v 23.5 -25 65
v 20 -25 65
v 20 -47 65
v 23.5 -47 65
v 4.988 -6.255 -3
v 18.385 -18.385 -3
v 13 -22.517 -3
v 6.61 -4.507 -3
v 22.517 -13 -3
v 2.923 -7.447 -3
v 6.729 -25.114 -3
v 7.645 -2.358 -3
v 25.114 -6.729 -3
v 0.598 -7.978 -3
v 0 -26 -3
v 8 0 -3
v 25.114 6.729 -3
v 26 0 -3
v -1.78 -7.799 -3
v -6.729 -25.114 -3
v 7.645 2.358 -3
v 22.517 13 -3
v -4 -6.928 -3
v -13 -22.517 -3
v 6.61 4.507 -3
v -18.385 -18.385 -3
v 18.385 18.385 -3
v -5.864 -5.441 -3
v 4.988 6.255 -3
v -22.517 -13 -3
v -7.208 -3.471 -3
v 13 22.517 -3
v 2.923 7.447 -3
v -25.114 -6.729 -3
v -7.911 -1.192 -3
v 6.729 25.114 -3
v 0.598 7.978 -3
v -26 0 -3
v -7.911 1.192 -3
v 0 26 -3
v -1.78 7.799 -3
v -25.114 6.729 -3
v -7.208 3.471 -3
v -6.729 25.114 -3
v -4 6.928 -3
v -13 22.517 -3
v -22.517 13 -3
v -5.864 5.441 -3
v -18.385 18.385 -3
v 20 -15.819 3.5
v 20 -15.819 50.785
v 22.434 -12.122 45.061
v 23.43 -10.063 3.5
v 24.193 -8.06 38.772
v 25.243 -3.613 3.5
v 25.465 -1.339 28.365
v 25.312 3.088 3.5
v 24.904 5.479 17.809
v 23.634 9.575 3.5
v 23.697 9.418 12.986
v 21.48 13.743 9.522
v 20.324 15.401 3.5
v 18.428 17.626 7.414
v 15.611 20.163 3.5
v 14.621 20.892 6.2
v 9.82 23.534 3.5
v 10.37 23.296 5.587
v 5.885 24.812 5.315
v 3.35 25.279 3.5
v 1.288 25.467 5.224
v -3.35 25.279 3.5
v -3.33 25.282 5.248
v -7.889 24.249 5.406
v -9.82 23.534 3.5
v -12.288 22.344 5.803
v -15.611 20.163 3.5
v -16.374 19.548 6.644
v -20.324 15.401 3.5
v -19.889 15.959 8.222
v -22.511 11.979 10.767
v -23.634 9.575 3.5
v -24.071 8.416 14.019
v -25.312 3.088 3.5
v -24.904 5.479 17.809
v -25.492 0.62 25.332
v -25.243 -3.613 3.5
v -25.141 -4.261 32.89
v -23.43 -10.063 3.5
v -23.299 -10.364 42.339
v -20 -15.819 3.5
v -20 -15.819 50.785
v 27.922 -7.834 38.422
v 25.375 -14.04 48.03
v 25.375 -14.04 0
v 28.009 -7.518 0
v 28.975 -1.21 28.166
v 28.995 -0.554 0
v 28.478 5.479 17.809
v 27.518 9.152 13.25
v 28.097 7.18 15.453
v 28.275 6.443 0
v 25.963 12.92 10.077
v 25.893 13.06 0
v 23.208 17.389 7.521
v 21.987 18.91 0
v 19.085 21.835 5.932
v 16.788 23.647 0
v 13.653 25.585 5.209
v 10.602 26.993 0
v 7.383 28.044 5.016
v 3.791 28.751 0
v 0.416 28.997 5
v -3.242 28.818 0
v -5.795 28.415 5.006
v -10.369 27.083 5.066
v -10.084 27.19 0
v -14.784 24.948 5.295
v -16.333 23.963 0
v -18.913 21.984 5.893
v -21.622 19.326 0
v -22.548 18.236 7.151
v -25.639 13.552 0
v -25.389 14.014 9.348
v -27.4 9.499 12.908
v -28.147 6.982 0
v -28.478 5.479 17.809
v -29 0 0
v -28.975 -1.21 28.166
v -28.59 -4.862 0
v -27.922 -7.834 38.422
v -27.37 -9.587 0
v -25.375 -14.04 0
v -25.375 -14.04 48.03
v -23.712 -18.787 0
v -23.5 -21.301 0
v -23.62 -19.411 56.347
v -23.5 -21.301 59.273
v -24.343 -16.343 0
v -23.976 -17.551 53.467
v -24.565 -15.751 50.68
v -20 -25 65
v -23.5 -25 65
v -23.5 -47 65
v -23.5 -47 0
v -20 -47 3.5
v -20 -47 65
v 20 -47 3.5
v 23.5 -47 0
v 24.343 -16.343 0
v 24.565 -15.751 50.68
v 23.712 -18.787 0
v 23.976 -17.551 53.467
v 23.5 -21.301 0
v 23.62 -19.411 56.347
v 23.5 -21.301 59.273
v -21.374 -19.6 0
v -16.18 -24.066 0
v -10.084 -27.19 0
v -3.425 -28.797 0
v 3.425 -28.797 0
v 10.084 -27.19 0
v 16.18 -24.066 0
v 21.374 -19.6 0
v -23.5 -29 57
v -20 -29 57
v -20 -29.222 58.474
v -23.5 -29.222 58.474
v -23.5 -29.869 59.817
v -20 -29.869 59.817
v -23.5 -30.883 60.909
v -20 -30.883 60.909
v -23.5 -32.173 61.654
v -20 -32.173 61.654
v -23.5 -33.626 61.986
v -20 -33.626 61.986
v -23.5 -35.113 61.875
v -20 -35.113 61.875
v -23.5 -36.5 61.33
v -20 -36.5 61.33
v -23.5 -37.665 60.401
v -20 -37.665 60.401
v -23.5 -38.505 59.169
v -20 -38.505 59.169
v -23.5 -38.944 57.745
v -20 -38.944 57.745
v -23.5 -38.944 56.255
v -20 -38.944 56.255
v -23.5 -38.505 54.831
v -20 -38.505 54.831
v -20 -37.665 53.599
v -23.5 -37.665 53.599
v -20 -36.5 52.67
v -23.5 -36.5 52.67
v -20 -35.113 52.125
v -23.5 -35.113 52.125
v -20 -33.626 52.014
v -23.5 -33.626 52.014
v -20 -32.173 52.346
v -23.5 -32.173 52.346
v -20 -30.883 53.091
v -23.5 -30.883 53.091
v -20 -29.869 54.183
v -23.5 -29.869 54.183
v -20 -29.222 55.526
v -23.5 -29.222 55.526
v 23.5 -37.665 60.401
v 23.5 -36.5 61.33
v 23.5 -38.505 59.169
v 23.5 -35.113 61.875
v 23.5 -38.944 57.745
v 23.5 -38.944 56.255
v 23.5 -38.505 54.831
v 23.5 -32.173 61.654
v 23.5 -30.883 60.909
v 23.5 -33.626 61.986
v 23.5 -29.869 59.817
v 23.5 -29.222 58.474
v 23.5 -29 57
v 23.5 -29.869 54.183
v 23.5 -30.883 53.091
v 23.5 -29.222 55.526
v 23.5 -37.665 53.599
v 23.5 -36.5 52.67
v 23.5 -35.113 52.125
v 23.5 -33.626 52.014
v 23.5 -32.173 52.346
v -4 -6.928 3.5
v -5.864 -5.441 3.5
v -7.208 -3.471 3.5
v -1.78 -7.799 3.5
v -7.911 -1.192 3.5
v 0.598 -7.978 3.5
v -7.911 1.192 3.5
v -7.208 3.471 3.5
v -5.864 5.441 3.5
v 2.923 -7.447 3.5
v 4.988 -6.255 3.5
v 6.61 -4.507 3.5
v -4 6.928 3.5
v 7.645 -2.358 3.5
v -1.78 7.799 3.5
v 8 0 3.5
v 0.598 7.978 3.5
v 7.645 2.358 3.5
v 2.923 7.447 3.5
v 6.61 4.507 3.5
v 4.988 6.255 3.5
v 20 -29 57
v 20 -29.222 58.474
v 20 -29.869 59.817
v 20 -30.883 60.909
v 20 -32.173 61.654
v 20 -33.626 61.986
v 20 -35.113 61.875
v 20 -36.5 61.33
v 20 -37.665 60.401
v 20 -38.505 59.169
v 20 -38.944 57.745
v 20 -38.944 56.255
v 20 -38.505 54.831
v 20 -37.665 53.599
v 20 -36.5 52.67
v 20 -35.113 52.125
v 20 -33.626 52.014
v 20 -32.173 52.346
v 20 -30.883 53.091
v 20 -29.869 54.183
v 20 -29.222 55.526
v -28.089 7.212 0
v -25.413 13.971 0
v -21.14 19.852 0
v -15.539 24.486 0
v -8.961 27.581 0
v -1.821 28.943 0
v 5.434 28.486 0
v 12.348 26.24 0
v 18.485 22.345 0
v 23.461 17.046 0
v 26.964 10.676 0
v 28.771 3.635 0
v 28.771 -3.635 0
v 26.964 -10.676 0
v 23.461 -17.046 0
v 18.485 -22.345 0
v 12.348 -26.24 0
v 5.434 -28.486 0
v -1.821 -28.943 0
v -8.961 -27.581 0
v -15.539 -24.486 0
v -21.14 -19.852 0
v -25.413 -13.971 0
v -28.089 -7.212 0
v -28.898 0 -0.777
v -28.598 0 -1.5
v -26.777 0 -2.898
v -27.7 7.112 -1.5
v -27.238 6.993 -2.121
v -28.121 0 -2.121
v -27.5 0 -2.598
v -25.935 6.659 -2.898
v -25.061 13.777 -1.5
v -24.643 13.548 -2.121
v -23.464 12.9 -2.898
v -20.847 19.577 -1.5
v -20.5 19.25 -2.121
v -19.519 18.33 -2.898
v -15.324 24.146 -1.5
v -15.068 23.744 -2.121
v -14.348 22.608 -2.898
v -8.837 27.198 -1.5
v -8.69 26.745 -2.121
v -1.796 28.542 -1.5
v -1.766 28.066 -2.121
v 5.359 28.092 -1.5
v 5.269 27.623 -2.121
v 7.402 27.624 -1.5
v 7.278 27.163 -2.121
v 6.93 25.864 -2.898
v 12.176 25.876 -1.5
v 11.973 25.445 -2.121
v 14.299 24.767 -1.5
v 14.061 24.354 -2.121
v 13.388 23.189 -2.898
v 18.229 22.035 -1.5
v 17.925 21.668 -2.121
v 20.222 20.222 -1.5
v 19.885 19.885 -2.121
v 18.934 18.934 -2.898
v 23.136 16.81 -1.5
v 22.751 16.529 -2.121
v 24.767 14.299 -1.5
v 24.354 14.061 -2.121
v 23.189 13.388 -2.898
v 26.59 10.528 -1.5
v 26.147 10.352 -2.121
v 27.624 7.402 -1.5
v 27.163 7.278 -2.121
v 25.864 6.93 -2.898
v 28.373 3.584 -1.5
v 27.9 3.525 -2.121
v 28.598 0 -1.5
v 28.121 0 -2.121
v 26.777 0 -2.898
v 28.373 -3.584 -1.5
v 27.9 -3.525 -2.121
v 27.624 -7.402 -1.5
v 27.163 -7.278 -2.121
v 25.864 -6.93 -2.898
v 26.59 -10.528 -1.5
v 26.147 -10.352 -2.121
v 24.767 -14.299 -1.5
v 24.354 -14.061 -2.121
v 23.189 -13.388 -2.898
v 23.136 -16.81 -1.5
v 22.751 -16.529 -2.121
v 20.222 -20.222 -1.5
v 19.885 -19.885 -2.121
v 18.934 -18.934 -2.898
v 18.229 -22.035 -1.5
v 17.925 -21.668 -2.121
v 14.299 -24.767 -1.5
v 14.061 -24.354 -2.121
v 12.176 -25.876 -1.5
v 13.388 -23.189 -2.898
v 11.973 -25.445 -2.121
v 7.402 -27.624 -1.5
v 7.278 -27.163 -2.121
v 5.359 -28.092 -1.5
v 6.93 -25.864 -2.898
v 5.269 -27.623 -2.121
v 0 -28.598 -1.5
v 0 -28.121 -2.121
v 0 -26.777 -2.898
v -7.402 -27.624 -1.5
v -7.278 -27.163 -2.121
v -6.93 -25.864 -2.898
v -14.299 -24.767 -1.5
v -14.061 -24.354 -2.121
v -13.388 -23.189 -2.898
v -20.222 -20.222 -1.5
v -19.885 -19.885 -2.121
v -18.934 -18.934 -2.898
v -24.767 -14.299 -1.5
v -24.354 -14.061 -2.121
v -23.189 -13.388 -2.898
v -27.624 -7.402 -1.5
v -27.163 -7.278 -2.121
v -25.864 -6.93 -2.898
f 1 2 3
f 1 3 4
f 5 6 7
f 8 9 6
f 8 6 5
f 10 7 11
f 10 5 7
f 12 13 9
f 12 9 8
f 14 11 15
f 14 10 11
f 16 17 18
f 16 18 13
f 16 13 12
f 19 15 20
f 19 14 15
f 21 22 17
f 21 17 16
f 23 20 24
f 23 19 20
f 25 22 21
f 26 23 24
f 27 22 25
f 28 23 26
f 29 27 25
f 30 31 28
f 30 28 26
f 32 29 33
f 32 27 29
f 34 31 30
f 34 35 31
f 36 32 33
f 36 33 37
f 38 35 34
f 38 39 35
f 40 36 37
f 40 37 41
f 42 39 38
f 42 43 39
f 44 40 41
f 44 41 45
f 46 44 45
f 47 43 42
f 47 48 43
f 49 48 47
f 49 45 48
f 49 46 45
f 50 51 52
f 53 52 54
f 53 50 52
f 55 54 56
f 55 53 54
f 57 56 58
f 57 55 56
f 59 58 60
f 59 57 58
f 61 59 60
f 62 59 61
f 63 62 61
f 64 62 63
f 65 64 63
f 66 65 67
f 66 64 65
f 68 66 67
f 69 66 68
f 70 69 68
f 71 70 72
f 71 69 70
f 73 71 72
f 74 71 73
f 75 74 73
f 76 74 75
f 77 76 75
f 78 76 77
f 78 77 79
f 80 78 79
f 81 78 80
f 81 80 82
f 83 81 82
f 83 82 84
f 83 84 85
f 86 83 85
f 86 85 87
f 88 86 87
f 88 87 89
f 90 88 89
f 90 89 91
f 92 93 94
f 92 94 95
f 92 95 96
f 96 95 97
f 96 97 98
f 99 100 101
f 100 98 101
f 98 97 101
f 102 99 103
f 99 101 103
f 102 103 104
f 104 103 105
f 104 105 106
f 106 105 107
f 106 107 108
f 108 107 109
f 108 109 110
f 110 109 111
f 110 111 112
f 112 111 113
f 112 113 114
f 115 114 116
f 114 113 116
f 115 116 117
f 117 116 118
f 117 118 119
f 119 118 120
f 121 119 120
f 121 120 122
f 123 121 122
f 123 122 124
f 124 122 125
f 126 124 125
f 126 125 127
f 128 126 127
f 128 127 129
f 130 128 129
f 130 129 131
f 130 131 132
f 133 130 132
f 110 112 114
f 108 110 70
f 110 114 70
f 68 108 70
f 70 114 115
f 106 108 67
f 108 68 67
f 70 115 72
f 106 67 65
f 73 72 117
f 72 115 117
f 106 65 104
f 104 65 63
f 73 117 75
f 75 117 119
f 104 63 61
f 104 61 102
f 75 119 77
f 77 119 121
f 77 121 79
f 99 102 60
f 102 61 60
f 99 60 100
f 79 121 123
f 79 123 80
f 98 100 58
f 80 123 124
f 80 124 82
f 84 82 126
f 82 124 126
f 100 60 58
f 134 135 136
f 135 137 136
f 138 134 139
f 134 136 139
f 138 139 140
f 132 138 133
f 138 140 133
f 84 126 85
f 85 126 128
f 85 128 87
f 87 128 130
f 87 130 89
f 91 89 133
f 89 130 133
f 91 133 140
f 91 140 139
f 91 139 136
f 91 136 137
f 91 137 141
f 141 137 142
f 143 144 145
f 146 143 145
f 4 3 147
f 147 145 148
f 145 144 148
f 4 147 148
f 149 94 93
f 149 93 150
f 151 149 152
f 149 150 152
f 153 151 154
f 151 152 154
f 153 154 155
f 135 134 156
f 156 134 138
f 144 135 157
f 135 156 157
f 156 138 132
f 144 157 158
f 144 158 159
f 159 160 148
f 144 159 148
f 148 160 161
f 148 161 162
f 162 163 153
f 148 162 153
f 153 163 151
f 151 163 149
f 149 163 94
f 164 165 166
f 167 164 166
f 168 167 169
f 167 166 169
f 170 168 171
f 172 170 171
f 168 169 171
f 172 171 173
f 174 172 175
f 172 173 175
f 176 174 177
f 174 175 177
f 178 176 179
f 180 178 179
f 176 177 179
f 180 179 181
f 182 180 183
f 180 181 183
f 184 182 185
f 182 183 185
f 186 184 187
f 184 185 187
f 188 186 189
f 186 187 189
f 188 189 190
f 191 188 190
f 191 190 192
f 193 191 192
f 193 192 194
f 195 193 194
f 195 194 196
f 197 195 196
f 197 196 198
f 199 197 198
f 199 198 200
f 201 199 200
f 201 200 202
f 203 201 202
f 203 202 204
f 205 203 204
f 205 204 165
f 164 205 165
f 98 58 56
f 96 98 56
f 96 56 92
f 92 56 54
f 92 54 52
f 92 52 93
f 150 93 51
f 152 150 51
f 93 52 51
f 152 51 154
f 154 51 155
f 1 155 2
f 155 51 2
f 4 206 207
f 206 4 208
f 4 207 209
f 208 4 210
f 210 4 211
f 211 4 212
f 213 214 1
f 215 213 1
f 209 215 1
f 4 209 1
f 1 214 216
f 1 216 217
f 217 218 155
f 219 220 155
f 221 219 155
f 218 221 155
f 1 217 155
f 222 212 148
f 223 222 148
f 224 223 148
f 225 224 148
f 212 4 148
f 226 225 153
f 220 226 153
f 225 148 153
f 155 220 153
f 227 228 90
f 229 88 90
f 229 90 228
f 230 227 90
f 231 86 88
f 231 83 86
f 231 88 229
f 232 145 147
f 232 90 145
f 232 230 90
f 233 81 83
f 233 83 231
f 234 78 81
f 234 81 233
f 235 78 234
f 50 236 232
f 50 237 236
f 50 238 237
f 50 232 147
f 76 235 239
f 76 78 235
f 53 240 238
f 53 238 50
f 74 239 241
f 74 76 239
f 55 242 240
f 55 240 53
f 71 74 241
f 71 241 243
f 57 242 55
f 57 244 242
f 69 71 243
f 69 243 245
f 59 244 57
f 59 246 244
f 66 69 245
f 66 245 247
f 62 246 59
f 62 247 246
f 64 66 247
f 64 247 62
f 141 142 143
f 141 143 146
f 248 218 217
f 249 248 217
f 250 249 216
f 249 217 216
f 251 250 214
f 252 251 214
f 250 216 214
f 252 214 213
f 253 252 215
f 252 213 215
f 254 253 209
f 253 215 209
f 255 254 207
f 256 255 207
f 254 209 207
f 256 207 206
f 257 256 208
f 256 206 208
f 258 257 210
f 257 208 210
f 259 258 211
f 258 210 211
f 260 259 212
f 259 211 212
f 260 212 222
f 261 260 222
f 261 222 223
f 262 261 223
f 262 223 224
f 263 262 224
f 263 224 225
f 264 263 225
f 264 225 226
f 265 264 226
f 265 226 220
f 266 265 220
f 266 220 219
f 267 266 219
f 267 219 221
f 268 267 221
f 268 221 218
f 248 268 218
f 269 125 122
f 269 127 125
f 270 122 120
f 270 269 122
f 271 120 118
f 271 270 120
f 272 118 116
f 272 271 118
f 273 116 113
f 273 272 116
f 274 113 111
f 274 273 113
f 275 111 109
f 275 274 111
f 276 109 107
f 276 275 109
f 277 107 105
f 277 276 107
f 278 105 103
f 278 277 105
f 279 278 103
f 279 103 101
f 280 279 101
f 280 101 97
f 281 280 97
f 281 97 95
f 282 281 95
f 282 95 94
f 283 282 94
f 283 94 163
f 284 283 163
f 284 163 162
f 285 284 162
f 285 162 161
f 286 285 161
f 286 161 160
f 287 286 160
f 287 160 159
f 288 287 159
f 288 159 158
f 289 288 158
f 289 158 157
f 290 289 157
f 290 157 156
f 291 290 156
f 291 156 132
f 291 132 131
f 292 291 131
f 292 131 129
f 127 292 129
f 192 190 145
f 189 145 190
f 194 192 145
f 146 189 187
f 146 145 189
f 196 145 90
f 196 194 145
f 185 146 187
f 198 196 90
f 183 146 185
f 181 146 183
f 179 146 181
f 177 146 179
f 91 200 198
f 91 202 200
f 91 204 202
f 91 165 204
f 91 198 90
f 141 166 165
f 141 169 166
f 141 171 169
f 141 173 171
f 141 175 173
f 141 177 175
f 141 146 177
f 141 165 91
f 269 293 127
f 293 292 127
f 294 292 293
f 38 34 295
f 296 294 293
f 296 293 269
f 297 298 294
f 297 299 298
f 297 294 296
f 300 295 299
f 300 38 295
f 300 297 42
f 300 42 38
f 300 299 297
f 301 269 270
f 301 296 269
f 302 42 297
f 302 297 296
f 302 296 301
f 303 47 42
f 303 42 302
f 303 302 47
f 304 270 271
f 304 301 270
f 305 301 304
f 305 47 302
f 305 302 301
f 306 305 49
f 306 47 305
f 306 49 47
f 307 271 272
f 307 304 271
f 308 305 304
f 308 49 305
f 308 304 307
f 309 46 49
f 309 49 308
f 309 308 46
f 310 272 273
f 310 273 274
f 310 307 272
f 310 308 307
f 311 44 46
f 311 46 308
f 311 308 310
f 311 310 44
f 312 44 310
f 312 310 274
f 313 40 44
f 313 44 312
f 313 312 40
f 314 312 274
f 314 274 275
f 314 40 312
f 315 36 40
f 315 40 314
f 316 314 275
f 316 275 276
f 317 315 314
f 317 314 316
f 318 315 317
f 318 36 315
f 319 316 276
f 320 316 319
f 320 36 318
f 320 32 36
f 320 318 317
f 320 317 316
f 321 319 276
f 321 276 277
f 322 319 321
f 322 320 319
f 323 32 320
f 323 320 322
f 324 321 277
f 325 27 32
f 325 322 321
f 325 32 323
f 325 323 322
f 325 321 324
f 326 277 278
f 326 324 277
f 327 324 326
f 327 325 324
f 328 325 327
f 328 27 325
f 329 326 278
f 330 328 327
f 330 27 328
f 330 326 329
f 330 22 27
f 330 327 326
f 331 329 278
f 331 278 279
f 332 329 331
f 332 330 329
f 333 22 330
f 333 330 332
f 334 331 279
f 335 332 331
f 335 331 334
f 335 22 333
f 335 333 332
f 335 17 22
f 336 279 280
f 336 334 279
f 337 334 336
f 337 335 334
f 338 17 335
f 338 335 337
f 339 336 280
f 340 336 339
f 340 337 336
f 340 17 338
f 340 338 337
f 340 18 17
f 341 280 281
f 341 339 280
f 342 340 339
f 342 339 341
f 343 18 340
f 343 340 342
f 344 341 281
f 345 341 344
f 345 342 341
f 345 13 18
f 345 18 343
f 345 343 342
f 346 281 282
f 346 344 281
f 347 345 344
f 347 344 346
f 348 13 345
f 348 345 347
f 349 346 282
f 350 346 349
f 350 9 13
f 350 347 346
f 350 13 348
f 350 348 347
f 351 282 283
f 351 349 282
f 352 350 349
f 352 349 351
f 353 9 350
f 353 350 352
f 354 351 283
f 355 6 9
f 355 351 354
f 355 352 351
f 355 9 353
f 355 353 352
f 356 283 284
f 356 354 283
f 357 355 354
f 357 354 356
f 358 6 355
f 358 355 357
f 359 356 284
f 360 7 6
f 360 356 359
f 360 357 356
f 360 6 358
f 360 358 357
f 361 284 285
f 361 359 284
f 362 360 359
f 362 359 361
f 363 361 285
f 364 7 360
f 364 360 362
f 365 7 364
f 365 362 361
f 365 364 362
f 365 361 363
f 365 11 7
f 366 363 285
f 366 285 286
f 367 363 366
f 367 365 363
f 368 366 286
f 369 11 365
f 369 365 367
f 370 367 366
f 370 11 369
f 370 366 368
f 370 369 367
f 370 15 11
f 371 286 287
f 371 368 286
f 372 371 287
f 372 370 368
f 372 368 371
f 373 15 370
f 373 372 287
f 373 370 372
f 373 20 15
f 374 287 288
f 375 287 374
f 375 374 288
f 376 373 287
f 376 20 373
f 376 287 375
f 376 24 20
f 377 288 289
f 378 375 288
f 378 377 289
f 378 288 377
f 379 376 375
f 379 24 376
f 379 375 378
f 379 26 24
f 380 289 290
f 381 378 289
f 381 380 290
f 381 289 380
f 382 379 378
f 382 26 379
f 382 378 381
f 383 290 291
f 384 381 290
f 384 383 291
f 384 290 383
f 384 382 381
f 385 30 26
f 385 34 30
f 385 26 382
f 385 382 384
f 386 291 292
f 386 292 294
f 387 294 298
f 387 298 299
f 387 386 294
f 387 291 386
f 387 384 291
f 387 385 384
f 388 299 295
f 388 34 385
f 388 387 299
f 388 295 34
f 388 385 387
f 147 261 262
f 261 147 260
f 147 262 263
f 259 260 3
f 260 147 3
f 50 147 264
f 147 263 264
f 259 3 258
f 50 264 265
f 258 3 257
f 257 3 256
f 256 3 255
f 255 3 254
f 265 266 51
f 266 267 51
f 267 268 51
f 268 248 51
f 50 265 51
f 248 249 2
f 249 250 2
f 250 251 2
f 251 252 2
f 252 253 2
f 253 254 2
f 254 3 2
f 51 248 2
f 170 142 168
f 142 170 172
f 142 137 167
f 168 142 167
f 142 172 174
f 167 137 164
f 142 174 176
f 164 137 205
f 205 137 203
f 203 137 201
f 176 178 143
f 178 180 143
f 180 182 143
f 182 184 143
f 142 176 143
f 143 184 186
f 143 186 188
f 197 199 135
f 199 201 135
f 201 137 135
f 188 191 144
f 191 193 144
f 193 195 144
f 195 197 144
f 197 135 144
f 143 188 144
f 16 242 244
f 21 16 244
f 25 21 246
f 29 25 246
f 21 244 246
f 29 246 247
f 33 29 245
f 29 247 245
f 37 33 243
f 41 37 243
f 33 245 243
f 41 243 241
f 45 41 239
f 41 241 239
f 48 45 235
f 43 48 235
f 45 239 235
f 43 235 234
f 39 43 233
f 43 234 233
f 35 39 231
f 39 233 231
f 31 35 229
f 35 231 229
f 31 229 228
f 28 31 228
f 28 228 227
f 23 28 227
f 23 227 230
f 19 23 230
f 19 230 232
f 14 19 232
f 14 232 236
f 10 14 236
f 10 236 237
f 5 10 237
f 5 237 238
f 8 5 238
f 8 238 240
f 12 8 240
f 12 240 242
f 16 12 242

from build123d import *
from build123d.topology import SkipClean

# Parameters (mm, degrees)
EXTRUDE_1_DEPTH          = 65
SHELL_1_T                = -3.5
CUT_EXTRUDE_3_DEPTH      = 86.293611
CUT_EXTRUDE_3_DEPTH_BACK = 86.293611
FILLET_1_R               = 15
SKETCH_3_W               = 40
SKETCH_3_H               = 3.5
CUT_EXTRUDE_4_DEPTH      = 61.5
SKETCH_4_R               = 5
CUT_EXTRUDE_5_DEPTH      = 96.865792
EXTRUDE_START            = 3
SKETCH_5_R               = 29
EXTRUDE_2_DEPTH          = 3
FILLET_2_R               = 3
SKETCH_6_R               = 8
CUT_EXTRUDE_6_DEPTH      = 83.657426


with BuildPart() as part:
    # 草图1 → 凸台-拉伸1 (new body)
    with BuildSketch(Plane.XY):
        with BuildLine():
            Line((-23.5, -16.992645), (-23.5, -47))
            Line((-23.5, -47), (23.5, -47))
            Line((23.5, -47), (23.5, -16.992645))
            ThreePointArc((23.5, -16.992645), (0, 29), (-23.5, -16.992645))
        make_face()
    extrude(amount=EXTRUDE_1_DEPTH)

    # 抽壳1
    shell_1_openings = [part.faces().sort_by_distance(p)[0] for p in [
        (0, -9.973122, 65),
    ]]
    offset(amount=SHELL_1_T, openings=shell_1_openings, kind=Kind.INTERSECTION)

    # 草图2 → 切除-拉伸3 (cut, two sides: drawn at the far end of the back side and taken through both)
    with BuildSketch(Plane(origin=(0, 0, 0), x_dir=(0, 0, -1), z_dir=(1, 0, 0)).offset(-CUT_EXTRUDE_3_DEPTH_BACK)):
        with BuildLine():
            Line((-5, 232.659495), (-5, 29))
            ThreePointArc((-5, 29), (-8.409806, 15.608871), (-17.808738, 5.479252))
            Line((-17.808738, 5.479252), (-65, -25))
            Line((-65, -25), (-236.079414, -135.494453))
            Line((-236.079414, -135.494453), (-581.070507, 81.046318))
            Line((-581.070507, 81.046318), (-349.991093, 449.200266))
            Line((-349.991093, 449.200266), (-5, 232.659495))
        make_face()
    extrude(amount=CUT_EXTRUDE_3_DEPTH + CUT_EXTRUDE_3_DEPTH_BACK, mode=Mode.SUBTRACT)

    # 圆角1
    fillet_1_edges = [part.edges().sort_by_distance(p)[0] for p in [
        (-23.5, -16.992645, 26.301076),
        (23.5, -16.992645, 26.301076),
    ]]
    fillet(fillet_1_edges, radius=FILLET_1_R)

    # 草图3 → 切除-拉伸4 (cut)
    with BuildSketch(Plane.XY.offset(65)):
        with Locations((0, -45.25)):
            Rectangle(SKETCH_3_W, SKETCH_3_H)
    extrude(amount=-CUT_EXTRUDE_4_DEPTH, mode=Mode.SUBTRACT)

    # 草图4 → 切除-拉伸5 (cut, through all)
    with BuildSketch(Plane(origin=(23.5, 0, 0), x_dir=(0, 0, -1), z_dir=(1, 0, 0))):
        with Locations(Location((-57, -34, 0), (0, 0, 90))):
            Circle(SKETCH_4_R)
    extrude(amount=-CUT_EXTRUDE_5_DEPTH, mode=Mode.SUBTRACT)

    # 草图5 → 凸台-拉伸2 (add)
    with SkipClean():  # the faces are left unmerged after this step: merging them gives an invalid solid
        with BuildSketch(Plane(origin=(0, 0, 0), x_dir=(-1, 0, 0), z_dir=(0, 0, -1)).offset(EXTRUDE_START)):
            Circle(SKETCH_5_R)
        extrude(amount=-EXTRUDE_2_DEPTH)

    # 圆角2
    fillet_2_edges = [part.edges().sort_by_distance(p)[0] for p in [
        (29, 0, -3),
    ]]
    fillet(fillet_2_edges, radius=FILLET_2_R - 0.0001)  # a hair under: the kernel refuses the full size

    # 草图6 → 切除-拉伸6 (cut, through all)
    with BuildSketch(Plane.XY.offset(3.5)):
        Circle(SKETCH_6_R)
    extrude(amount=-CUT_EXTRUDE_6_DEPTH, mode=Mode.SUBTRACT)


solid = part.part
